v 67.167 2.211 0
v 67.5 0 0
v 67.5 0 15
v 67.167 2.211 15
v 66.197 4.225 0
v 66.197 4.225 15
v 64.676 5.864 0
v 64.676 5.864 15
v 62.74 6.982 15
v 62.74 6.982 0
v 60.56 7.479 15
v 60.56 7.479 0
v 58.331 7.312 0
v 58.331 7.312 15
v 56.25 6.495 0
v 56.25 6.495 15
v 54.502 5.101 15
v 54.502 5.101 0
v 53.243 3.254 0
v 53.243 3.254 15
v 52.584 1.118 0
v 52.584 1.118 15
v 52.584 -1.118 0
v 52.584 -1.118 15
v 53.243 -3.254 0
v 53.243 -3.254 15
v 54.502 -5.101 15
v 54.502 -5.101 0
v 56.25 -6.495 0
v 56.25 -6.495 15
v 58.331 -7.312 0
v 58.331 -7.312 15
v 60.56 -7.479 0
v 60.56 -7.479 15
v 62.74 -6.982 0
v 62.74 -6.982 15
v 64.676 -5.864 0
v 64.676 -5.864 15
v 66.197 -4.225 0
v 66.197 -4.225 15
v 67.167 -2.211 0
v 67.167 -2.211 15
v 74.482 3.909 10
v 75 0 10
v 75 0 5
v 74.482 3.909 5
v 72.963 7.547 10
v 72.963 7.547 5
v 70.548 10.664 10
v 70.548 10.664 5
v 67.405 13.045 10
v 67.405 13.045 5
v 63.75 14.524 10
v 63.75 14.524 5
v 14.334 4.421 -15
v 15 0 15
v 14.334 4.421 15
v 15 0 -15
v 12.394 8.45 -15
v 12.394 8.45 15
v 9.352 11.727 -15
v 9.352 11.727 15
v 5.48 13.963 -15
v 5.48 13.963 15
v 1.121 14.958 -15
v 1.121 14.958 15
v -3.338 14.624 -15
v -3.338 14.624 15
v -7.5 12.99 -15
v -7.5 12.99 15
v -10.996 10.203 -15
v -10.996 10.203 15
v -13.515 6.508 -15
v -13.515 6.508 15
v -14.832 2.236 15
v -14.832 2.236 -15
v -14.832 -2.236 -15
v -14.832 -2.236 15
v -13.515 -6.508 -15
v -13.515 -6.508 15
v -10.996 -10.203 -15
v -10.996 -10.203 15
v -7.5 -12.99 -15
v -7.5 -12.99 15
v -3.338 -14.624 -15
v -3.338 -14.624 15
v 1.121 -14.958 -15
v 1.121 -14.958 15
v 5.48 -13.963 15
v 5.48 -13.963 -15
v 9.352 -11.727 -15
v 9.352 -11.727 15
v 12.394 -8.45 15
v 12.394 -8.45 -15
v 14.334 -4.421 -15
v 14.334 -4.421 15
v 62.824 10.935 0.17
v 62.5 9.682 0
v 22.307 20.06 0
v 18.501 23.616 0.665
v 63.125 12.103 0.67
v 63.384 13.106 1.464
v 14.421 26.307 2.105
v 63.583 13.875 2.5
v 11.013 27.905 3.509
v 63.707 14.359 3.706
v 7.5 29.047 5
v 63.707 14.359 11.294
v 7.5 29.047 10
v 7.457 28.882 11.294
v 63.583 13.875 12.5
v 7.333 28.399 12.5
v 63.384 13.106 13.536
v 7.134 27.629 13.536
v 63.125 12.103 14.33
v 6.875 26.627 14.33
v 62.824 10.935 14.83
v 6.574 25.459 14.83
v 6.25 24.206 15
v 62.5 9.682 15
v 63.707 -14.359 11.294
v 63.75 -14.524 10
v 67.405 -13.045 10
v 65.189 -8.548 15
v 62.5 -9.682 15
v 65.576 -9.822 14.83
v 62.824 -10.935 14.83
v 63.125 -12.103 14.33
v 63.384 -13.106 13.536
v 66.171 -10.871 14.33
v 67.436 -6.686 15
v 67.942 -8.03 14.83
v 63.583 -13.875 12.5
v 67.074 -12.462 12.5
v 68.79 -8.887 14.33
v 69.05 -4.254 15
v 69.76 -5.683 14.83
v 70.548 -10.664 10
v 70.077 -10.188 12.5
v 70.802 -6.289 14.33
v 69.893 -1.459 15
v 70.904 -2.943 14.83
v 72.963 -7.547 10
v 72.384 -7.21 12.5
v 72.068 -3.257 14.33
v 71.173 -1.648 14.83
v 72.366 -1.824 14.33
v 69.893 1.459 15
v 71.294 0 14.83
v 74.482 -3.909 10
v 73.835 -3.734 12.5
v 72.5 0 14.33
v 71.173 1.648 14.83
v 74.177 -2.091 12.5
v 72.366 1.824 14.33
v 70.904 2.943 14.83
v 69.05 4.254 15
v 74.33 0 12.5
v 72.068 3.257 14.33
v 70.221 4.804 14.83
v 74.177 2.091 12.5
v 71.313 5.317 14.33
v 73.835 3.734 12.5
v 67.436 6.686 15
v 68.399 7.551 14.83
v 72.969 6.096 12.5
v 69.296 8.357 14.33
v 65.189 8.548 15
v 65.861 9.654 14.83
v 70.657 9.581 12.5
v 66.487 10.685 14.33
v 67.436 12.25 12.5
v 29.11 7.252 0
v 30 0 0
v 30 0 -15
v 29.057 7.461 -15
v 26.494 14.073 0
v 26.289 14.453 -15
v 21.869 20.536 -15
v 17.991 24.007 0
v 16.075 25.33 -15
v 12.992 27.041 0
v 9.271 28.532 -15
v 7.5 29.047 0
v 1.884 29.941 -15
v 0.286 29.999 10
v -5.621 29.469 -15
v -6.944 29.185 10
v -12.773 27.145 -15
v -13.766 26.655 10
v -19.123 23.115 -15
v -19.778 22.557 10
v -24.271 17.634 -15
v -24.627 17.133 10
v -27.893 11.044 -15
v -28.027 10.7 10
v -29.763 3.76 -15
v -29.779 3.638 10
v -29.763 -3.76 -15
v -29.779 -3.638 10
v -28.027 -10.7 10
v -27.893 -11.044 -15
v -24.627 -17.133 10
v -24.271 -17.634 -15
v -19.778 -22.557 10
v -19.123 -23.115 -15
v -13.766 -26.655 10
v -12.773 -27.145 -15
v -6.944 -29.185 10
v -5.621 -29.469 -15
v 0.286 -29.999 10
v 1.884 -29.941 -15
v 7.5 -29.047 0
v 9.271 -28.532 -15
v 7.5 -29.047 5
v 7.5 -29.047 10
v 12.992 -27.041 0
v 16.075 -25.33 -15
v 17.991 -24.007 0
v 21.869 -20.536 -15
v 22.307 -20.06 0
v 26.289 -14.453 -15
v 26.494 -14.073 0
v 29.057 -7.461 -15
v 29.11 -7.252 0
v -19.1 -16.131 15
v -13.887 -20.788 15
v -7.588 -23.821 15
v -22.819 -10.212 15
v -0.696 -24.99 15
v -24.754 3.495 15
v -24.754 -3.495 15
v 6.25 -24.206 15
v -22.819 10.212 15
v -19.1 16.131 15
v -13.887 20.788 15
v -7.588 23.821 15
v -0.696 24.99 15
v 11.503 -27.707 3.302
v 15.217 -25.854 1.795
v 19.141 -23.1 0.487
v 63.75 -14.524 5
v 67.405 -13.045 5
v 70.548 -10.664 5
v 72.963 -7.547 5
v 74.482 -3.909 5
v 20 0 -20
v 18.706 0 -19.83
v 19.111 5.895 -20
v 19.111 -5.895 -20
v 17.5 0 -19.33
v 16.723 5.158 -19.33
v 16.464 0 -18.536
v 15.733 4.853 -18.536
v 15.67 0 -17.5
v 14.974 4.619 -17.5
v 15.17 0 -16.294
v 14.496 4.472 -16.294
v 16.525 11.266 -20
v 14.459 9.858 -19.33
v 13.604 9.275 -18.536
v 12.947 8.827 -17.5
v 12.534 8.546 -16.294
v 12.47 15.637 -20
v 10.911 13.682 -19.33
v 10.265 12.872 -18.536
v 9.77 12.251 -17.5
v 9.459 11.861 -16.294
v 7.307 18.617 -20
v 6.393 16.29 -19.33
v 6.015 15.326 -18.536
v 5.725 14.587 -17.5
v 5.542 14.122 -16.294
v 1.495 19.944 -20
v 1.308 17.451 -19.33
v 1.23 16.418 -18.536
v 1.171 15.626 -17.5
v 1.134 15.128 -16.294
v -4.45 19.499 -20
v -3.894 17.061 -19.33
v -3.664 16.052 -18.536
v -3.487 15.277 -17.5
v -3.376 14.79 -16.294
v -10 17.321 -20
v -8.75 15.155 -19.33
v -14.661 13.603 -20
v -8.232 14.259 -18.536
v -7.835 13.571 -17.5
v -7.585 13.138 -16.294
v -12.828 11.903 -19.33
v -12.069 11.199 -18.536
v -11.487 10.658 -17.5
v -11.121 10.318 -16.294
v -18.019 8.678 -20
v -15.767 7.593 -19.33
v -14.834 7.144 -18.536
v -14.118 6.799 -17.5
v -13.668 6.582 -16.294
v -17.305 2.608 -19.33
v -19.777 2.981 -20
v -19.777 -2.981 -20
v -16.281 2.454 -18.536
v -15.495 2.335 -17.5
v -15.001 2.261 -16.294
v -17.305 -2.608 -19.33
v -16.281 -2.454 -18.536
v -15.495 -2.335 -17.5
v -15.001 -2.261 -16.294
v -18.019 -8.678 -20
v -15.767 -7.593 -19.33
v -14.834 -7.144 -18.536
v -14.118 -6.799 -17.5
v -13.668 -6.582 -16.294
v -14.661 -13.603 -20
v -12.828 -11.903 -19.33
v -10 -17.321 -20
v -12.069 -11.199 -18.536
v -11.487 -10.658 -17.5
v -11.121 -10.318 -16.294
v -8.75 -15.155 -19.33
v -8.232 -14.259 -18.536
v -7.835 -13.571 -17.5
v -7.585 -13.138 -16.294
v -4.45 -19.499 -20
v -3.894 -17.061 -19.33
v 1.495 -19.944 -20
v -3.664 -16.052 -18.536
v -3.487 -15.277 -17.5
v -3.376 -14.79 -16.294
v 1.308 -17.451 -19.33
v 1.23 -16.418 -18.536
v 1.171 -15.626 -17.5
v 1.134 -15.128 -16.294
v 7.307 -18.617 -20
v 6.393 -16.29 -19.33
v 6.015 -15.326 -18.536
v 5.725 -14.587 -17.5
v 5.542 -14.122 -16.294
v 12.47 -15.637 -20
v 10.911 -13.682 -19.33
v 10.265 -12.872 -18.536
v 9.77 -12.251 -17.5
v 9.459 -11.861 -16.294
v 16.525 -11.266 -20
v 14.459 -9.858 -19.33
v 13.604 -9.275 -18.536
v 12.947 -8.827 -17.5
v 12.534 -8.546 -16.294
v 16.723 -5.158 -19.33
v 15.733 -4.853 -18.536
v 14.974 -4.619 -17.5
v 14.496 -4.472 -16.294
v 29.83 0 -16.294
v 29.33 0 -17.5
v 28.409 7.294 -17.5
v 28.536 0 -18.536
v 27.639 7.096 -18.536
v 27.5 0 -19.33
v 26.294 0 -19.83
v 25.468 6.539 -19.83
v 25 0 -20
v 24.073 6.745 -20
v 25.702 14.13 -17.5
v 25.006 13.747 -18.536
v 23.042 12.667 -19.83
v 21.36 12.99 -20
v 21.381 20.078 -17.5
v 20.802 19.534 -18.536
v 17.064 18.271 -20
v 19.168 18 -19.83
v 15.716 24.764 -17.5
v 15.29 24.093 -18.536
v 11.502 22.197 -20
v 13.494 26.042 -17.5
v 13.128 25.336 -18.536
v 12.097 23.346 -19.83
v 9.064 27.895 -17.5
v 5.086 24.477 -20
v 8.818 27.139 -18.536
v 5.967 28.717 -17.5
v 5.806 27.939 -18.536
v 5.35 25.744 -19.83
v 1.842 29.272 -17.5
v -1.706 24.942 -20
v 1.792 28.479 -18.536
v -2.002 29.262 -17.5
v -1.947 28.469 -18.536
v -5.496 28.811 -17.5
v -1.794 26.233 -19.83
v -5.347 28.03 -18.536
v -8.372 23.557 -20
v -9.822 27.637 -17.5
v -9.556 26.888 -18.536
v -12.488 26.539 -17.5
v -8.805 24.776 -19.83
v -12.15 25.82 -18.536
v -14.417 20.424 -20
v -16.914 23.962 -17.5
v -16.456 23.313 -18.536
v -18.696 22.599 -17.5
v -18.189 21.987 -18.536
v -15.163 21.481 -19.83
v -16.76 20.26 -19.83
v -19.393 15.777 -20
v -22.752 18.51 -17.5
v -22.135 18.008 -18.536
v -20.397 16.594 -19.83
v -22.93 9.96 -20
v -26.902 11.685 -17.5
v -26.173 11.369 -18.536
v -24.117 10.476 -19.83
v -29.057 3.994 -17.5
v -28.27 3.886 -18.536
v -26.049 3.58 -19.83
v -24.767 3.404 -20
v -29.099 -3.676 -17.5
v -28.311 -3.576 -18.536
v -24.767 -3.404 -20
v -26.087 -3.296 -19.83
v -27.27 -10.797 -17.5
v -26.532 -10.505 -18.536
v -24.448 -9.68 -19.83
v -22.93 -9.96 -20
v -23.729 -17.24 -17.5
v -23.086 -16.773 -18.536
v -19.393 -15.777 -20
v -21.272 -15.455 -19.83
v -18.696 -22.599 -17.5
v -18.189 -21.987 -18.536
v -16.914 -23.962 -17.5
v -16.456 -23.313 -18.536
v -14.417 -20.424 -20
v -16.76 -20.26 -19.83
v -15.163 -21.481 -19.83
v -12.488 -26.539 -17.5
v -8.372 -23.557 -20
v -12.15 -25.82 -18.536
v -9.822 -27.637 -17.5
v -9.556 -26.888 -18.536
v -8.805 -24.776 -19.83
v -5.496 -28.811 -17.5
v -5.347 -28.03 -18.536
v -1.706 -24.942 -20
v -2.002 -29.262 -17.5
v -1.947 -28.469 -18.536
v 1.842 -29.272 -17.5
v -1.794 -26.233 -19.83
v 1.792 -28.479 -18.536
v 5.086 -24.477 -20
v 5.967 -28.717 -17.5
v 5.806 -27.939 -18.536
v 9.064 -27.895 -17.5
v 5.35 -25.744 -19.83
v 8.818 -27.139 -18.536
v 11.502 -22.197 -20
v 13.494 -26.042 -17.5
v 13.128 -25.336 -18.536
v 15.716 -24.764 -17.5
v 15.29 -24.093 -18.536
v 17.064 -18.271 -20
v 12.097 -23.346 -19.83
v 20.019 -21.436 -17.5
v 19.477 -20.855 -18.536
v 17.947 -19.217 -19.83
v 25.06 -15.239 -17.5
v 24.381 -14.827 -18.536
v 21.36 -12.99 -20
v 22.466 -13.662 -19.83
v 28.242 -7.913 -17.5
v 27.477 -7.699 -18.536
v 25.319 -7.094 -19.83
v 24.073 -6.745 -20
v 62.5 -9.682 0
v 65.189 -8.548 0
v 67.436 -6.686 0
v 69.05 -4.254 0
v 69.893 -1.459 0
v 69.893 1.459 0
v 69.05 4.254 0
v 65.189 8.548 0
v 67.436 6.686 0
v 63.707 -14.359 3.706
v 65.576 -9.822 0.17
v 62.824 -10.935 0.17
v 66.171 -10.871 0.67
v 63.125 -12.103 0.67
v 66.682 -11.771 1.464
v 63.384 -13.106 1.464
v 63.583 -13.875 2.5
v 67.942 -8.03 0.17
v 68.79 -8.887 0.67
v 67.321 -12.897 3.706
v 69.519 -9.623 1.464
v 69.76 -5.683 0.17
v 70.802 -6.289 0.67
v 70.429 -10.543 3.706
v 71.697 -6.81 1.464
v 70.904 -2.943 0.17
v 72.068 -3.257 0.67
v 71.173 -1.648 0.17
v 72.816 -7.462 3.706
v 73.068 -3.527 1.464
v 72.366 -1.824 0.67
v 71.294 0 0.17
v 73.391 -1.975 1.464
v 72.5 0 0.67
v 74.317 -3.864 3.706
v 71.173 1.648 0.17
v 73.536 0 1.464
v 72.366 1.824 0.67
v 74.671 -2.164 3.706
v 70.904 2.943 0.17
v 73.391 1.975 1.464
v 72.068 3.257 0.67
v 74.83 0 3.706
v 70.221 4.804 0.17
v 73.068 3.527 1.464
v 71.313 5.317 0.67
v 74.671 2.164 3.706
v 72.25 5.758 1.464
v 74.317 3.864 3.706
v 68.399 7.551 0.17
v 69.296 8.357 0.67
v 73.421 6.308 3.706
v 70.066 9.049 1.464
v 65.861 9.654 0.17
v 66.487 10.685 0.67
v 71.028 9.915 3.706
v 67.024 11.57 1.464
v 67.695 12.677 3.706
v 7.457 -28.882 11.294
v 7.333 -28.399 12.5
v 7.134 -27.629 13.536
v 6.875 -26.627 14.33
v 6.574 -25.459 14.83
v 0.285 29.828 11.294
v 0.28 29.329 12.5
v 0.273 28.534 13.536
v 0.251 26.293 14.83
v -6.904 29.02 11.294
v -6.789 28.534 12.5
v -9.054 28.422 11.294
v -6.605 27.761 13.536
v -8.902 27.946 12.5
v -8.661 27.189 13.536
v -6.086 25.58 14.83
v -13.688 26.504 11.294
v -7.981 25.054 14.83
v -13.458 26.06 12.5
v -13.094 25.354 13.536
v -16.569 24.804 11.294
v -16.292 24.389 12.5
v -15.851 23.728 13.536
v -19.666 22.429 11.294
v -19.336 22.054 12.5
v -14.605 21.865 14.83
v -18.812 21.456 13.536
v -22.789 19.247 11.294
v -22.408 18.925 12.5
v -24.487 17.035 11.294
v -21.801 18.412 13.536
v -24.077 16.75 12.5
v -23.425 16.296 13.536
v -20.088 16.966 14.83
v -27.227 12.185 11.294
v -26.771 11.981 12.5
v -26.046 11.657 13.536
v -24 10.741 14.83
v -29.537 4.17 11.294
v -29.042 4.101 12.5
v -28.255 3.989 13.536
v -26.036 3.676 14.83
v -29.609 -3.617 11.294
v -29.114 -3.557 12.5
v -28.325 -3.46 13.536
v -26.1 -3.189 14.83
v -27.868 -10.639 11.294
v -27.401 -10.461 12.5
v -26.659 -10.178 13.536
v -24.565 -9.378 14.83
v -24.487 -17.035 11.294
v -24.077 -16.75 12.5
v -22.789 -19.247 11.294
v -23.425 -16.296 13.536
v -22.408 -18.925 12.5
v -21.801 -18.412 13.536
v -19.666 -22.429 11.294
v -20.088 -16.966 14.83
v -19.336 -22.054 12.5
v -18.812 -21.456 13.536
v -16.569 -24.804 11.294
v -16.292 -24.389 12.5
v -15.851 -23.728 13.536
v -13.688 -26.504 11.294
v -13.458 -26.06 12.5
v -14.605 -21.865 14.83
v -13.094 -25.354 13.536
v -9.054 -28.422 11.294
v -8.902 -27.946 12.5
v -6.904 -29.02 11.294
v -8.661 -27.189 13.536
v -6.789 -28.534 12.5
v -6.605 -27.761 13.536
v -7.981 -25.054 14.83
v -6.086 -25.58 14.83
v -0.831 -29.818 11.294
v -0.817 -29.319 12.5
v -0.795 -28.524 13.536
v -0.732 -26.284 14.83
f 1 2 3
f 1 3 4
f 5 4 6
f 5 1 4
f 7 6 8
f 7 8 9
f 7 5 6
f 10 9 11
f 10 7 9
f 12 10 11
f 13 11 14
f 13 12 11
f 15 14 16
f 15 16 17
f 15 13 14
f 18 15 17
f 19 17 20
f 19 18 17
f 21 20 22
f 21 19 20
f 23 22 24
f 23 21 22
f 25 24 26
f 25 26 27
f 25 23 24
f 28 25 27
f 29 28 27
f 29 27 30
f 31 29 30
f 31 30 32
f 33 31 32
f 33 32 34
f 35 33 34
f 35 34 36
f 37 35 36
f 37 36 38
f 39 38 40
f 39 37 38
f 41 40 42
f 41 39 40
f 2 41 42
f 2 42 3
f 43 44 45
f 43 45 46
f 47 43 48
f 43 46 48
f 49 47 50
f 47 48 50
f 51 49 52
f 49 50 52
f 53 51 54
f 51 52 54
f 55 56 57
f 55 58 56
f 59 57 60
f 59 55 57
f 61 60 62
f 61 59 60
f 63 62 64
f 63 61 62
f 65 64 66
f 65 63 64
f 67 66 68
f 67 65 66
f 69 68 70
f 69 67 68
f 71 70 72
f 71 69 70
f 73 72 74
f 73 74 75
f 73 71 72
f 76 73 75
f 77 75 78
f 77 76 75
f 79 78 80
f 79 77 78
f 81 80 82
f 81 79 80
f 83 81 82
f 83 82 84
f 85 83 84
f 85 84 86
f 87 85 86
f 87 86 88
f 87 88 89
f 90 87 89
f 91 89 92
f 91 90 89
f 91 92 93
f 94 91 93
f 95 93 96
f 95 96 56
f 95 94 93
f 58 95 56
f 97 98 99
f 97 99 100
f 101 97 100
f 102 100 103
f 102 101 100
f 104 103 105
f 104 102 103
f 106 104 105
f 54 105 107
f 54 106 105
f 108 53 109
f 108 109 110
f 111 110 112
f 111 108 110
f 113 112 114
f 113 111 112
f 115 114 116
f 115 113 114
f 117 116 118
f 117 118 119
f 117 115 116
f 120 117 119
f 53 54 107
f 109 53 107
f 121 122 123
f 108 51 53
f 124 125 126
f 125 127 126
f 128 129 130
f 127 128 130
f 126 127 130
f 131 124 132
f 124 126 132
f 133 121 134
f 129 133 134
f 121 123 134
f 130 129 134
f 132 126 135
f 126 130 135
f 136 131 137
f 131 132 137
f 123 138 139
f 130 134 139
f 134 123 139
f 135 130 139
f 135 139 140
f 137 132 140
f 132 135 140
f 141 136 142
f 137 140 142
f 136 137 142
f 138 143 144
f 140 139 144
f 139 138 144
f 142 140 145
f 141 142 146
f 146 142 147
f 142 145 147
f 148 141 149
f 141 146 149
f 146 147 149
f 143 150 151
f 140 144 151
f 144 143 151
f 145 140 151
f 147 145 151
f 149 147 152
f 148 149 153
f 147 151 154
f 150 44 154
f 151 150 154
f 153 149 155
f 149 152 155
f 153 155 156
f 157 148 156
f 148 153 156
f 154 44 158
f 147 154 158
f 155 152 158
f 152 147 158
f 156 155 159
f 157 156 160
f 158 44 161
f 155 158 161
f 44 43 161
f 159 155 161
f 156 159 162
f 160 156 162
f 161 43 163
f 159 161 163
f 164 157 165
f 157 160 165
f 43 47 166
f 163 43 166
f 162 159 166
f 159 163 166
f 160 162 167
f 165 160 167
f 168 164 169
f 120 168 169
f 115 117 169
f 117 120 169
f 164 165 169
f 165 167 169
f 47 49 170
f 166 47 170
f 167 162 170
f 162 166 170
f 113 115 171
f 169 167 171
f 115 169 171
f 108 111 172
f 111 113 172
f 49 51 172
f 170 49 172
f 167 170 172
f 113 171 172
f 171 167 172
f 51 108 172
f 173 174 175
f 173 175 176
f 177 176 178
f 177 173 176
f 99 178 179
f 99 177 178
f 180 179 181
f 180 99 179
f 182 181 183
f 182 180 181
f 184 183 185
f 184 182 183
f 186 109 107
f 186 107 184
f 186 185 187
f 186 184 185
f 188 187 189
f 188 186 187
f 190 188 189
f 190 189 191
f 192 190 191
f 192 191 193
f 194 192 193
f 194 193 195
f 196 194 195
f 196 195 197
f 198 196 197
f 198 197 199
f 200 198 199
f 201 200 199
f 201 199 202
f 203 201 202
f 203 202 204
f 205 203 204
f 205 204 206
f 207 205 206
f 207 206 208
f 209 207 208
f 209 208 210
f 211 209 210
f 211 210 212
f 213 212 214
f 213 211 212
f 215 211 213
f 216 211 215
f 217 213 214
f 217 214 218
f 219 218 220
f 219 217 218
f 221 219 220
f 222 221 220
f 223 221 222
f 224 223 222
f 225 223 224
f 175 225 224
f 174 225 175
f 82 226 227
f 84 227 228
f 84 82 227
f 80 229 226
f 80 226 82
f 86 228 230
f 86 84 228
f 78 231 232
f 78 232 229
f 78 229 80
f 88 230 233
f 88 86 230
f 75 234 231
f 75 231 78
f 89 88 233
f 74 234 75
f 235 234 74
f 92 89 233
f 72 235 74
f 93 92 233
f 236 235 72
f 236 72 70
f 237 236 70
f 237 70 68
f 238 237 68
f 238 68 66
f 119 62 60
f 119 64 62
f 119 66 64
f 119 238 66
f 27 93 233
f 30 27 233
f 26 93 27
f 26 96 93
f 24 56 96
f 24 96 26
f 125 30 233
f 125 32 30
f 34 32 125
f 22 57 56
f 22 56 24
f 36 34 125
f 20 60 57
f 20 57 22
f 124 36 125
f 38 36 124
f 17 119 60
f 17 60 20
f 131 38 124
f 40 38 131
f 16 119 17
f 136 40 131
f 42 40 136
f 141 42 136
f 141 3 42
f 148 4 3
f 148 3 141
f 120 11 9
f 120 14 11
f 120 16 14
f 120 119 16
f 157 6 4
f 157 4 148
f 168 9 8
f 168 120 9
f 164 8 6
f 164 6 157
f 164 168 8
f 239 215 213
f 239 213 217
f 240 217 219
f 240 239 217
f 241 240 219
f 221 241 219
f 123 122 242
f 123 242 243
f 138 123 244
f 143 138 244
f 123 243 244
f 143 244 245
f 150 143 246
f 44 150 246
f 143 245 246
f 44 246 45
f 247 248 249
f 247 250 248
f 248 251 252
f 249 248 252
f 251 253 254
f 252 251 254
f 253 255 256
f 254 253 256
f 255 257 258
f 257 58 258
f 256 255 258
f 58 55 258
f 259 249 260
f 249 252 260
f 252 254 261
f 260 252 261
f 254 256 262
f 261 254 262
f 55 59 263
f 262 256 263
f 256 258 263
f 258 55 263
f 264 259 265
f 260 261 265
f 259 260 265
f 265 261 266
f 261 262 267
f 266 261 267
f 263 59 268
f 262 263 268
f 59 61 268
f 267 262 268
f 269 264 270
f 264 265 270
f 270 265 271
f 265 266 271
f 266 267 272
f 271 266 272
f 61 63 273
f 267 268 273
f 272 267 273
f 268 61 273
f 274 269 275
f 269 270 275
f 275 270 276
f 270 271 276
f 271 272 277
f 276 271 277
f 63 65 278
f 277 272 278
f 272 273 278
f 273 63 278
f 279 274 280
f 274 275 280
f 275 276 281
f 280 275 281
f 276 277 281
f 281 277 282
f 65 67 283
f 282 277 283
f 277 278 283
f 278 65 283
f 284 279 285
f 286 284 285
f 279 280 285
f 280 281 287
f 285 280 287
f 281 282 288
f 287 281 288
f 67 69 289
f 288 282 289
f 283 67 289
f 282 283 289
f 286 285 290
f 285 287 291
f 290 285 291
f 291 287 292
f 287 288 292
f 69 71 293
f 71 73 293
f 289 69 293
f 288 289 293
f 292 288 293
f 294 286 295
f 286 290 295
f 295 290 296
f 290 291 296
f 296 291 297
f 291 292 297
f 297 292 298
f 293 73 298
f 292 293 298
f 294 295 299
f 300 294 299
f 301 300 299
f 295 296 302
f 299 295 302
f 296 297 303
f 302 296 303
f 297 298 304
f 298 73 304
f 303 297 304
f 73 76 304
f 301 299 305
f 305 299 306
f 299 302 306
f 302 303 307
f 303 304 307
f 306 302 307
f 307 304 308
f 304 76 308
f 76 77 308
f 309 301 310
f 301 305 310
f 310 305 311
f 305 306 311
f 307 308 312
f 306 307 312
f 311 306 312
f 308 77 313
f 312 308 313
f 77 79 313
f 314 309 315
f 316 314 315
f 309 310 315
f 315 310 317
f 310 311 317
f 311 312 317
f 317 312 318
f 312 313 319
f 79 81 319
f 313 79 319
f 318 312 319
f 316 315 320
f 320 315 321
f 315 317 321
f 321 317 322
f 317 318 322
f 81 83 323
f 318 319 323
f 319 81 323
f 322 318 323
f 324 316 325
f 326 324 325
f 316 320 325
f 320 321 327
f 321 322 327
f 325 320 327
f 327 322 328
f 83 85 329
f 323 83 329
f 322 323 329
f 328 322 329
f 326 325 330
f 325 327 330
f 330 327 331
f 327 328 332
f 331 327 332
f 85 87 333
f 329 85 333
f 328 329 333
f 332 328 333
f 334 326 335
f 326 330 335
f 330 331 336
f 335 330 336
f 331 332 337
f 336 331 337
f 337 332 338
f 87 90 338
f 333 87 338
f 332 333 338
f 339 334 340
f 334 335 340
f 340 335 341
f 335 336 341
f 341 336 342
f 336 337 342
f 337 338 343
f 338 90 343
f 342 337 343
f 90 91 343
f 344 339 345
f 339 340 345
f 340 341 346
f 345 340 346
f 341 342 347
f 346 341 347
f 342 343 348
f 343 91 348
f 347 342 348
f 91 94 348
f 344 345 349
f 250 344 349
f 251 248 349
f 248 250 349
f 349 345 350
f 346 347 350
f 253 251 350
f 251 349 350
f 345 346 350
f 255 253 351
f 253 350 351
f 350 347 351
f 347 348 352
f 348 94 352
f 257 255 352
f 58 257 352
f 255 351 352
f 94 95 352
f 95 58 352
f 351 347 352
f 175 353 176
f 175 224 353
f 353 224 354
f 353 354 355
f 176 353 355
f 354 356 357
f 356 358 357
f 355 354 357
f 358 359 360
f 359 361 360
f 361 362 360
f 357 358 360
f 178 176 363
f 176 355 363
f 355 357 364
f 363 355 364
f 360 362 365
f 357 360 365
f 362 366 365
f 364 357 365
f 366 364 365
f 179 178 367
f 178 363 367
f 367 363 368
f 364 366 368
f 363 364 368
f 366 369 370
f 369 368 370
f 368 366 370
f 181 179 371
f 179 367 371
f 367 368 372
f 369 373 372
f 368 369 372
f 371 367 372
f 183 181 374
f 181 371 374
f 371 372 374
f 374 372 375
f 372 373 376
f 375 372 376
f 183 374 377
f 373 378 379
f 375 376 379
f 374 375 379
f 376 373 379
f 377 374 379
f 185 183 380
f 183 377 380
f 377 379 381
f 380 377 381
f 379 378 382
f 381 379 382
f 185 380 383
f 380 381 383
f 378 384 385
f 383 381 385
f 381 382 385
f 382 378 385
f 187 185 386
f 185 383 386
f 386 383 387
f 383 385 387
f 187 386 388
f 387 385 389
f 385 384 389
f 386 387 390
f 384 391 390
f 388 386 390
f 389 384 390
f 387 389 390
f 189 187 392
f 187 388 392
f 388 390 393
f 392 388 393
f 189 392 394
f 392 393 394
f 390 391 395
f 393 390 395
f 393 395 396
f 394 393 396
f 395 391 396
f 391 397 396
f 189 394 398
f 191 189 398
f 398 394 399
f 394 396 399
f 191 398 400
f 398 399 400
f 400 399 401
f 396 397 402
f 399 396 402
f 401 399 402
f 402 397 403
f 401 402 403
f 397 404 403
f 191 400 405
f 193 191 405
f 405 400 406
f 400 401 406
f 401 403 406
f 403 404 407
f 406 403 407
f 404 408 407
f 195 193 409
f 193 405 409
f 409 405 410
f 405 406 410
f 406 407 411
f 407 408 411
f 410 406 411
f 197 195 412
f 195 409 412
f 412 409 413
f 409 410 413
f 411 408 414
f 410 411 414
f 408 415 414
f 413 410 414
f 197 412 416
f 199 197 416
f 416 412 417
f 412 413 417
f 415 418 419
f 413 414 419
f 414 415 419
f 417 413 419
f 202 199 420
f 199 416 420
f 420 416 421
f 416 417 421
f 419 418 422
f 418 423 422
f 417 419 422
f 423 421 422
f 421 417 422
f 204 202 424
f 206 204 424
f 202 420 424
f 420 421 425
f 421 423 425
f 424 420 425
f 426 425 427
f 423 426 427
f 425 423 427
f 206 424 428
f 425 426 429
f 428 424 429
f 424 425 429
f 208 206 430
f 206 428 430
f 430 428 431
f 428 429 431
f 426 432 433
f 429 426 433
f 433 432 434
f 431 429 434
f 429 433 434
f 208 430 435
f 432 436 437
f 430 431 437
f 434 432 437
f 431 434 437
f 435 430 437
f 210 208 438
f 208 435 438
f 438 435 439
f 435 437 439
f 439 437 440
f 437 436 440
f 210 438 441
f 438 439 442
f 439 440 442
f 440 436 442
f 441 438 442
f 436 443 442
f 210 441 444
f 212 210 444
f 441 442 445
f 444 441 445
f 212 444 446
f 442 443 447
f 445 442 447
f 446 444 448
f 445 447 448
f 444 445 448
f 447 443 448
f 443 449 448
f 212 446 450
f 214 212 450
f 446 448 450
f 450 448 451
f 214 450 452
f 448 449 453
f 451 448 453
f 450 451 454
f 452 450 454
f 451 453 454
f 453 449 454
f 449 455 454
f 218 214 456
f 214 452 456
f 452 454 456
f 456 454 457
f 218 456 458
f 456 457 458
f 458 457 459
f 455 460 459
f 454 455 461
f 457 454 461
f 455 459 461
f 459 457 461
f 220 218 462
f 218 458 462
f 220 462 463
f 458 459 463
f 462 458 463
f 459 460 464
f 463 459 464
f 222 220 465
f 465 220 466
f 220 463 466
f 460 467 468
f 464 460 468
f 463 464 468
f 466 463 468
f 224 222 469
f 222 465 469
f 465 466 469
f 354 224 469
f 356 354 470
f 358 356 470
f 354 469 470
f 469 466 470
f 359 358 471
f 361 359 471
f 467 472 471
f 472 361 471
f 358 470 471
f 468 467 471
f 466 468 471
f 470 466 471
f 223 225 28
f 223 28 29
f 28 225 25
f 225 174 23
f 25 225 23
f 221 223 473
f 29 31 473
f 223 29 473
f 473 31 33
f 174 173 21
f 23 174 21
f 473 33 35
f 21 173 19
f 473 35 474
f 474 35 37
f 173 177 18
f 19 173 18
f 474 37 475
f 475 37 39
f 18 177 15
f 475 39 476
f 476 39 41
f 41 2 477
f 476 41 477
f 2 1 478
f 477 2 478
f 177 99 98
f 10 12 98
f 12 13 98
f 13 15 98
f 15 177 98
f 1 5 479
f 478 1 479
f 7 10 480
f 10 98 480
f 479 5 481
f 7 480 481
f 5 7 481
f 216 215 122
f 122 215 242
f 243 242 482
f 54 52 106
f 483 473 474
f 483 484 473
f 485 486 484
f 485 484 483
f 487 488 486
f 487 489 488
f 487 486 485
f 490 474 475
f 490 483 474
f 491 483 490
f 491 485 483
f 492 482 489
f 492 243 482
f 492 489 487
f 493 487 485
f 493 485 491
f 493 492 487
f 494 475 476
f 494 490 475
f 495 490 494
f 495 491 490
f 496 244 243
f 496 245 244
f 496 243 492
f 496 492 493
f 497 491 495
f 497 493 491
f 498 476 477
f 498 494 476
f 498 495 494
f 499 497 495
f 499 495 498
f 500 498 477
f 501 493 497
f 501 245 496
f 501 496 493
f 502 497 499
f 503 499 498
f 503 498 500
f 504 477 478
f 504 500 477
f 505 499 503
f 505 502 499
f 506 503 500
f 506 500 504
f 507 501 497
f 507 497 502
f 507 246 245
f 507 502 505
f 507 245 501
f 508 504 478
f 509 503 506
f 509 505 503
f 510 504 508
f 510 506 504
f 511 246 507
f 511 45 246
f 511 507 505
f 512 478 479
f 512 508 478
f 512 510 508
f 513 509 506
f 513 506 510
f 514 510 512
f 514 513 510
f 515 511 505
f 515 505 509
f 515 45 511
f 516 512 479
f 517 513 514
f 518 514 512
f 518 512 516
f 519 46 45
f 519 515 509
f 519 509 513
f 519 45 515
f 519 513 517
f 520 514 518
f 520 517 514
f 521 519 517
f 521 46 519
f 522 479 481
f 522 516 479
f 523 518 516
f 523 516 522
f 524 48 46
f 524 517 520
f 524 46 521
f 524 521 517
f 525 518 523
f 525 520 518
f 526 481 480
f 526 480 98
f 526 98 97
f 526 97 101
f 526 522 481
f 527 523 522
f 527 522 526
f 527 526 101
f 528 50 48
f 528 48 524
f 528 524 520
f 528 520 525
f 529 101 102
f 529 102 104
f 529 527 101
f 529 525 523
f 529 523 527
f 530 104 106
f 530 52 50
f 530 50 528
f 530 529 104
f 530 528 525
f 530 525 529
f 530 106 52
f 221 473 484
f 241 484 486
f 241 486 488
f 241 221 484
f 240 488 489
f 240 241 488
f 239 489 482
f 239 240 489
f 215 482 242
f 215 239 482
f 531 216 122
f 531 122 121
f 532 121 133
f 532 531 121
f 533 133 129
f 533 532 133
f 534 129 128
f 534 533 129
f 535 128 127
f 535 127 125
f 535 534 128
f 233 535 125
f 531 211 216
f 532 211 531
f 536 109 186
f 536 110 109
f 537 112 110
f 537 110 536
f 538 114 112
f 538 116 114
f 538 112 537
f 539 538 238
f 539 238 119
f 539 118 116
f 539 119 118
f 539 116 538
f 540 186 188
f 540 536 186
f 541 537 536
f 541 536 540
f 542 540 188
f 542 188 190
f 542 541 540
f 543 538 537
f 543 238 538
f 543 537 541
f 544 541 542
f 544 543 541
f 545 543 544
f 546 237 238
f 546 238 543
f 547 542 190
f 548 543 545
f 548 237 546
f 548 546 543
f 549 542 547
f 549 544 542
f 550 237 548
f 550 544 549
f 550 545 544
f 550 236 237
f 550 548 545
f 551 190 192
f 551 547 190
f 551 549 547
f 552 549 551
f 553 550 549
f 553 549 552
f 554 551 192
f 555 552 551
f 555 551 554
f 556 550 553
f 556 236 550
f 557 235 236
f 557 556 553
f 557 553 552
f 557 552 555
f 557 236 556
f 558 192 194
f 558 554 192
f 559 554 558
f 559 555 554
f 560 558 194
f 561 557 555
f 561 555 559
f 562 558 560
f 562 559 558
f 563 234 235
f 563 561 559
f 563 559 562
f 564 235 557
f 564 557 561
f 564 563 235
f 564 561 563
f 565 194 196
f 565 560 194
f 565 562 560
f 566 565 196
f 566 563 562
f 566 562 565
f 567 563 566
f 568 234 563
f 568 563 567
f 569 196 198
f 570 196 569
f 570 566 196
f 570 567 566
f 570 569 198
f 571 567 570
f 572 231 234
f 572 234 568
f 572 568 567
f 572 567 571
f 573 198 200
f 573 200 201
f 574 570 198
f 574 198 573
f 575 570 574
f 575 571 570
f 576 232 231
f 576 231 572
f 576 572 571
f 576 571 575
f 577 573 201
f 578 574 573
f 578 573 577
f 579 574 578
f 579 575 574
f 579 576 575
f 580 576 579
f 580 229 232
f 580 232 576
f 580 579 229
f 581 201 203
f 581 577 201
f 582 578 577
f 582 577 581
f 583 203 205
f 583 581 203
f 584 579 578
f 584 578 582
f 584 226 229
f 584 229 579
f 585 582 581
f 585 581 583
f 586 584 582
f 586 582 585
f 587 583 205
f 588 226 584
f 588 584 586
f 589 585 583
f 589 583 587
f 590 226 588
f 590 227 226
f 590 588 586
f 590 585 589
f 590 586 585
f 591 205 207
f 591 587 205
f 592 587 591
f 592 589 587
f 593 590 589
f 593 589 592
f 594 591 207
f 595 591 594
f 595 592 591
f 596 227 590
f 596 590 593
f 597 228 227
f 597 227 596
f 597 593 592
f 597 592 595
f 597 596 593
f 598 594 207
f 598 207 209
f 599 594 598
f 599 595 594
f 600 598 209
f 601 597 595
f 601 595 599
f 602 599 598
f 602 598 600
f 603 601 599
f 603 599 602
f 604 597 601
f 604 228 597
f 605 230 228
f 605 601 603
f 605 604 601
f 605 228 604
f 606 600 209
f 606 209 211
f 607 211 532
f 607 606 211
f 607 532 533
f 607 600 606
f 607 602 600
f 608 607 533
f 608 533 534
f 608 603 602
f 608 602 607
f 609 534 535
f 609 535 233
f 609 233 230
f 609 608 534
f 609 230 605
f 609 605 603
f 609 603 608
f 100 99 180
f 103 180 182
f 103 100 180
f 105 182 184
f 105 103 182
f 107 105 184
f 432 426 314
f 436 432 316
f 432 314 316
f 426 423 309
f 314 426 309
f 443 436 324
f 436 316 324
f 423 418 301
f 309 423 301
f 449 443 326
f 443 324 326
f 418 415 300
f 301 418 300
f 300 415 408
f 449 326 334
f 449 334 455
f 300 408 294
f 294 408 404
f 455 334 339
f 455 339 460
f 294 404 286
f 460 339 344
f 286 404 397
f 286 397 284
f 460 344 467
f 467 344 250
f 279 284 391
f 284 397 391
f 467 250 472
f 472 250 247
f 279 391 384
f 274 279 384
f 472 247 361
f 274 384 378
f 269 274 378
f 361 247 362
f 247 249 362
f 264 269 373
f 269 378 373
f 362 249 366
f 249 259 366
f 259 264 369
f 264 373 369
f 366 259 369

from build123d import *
from build123d import SkipClean  # not in build123d's __all__

# Parameters (mm, degrees)
F0_R         = 15
F0_R_2       = 7.5
F1_DEPTH     = 15
F2_DEPTH     = 20
F3_R         = 5
F4_T1_DEPTH  = 58.0947501931
F4_T3_DEPTH  = 58.0947501931
F4_T8_DEPTH  = 79.3447501931
F4_S9_R      = 30
F4_T10_DEPTH = 43
F4_T12_ANGLE = 151.0449756281
F4_T14_ANGLE = 151.0449756281
F4_T18_DEPTH = 79.3447501931
F4_S19_R     = 30
F4_T20_DEPTH = 43
F4_T22_ANGLE = 208.9550243719


# Not quite as in the source:
# - a fillet or chamfer that OpenCascade refuses, or shapes differently, is made with other operations: its cross-section is extruded or revolved along the edge and cut away or added


with BuildPart() as f1:
    # F0 (on Top) → F1 (new body)
    with BuildSketch(Plane.XY):
        with BuildLine():
            ThreePointArc((7.5, -29.0473750966), (23.7170824513, -18.3711730709), (30, 0))
            ThreePointArc((30, 0), (23.7170824513, 18.3711730709), (7.5, 29.0473750966))
            ThreePointArc((7.5, 29.0473750966), (-30, 0), (7.5, -29.0473750966))
        make_face()
        Circle(F0_R, mode=Mode.SUBTRACT)
        with BuildLine():
            ThreePointArc((7.5, 29.0473750966), (23.7170824513, 18.3711730709), (30, 0))
            ThreePointArc((30, 0), (23.7170824513, -18.3711730709), (7.5, -29.0473750966))
            Line((7.5, -29.0473750966), (63.75, -14.5236875483))
            ThreePointArc((63.75, -14.5236875483), (45, 0), (63.75, 14.5236875483))
            Line((63.75, 14.5236875483), (7.5, 29.0473750966))
        make_face()
        with BuildLine():
            ThreePointArc((75, 0), (71.8585412256, 9.1855865354), (63.75, 14.5236875483))
            ThreePointArc((63.75, 14.5236875483), (45, 0), (63.75, -14.5236875483))
            ThreePointArc((63.75, -14.5236875483), (71.8585412256, -9.1855865354), (75, 0))
        make_face()
        with Locations((60, 0)):
            Circle(F0_R_2, mode=Mode.SUBTRACT)
    extrude(amount=F1_DEPTH)

    # F0 (on Top) → F2 (join)
    with BuildSketch(Plane.XY):
        with BuildLine():
            ThreePointArc((7.5, -29.0473750966), (23.7170824513, -18.3711730709), (30, 0))
            ThreePointArc((30, 0), (23.7170824513, 18.3711730709), (7.5, 29.0473750966))
            ThreePointArc((7.5, 29.0473750966), (-30, 0), (7.5, -29.0473750966))
        make_face()
        Circle(F0_R, mode=Mode.SUBTRACT)
    with SkipClean():  # cleaning this boolean's faces spoils the solid; the shape is the same uncleaned
        extrude(amount=-F2_DEPTH)

    # F3
    f3_edges = [f1.edges().sort_by_distance(p)[0] for p in [
        (-7.5, 29.047375, -20),
        (-15, 0, -20),
    ]]
    fillet(f3_edges, radius=F3_R)

    # F4: fillet of radius 5 on 11 edges, made by hand

    # F4_s2 → F4_t1 (cut)
    with BuildSketch(Plane(origin=(0, 0, 0), x_dir=(0, 0, 1), z_dir=(0.9682458366, 0.25, 0))):
        with BuildLine():
            ThreePointArc((10, 30), (13.5355339059, 28.5355339059), (15, 25))
            Line((15, 25), (15, 30))
            Line((15, 30), (10, 30))
        make_face()
    extrude(amount=F4_T1_DEPTH, mode=Mode.SUBTRACT)

    # F4_s4 → F4_t3 (cut)
    with BuildSketch(Plane(origin=(56.25, -14.5236875483, 0), x_dir=(0, 0, 1), z_dir=(-0.9682458366, 0.25, 0))):
        with BuildLine():
            ThreePointArc((10, 30), (13.5355339059, 28.5355339059), (15, 25))
            Line((15, 25), (15, 30))
            Line((15, 30), (10, 30))
        make_face()
    extrude(amount=F4_T3_DEPTH, mode=Mode.SUBTRACT)


with BuildPart() as f4_tool6:
    # F4_s7 → F4_t8 (new body)
    with BuildSketch(Plane(origin=(-20.5752240267, -5.3125, 0), x_dir=(0, 0, 1), z_dir=(0.9682458366, 0.25, 0))):
        with BuildLine():
            ThreePointArc((0, 25), (1.4644660941, 28.5355339059), (5, 30))
            Line((5, 30), (0, 30))
            Line((0, 30), (0, 25))
        make_face()
    extrude(amount=F4_T8_DEPTH)

    # F4_s9 → F4_t10 (cut, symmetric)
    with BuildSketch(Plane.XY.offset(2.5)):
        Circle(F4_S9_R)
    extrude(amount=F4_T10_DEPTH, both=True, mode=Mode.SUBTRACT)


with BuildPart() as f1_1:
    add(f1.part, clean=False)

    # F4_t5: cut F4_tool6
    add(f4_tool6.part, mode=Mode.SUBTRACT)

    # F4_s11 → F4_t12 (revolve, cut)
    with BuildSketch(Plane(origin=(56.25, 14.5236875483, 0), x_dir=(0, 0, 1), z_dir=(-0.9682458366, -0.25, 0))):
        with BuildLine():
            ThreePointArc((0, -25), (1.4644660941, -28.5355339059), (5, -30))
            Line((5, -30), (0, -30))
            Line((0, -30), (0, -25))
        make_face()
    revolve(axis=Axis((60, 0, 0), (0, 0, 1)), revolution_arc=F4_T12_ANGLE, mode=Mode.SUBTRACT)

    # F4_s13 → F4_t14 (revolve, cut)
    with BuildSketch(Plane(origin=(56.25, 14.5236875483, 0), x_dir=(0, 0, 1), z_dir=(-0.9682458366, -0.25, 0))):
        with BuildLine():
            ThreePointArc((15, -25), (13.5355339059, -28.5355339059), (10, -30))
            Line((10, -30), (15, -30))
            Line((15, -30), (15, -25))
        make_face()
    revolve(axis=Axis((60, 0, 15), (0, 0, 1)), revolution_arc=F4_T14_ANGLE, mode=Mode.SUBTRACT)


with BuildPart() as f4_tool16:
    # F4_s17 → F4_t18 (new body)
    with BuildSketch(Plane(origin=(56.25, -14.5236875483, 0), x_dir=(0, 0, 1), z_dir=(-0.9682458366, 0.25, 0))):
        with BuildLine():
            ThreePointArc((0, 25), (1.4644660941, 28.5355339059), (5, 30))
            Line((5, 30), (0, 30))
            Line((0, 30), (0, 25))
        make_face()
    extrude(amount=F4_T18_DEPTH)

    # F4_s19 → F4_t20 (cut, symmetric)
    with BuildSketch(Plane.XY.offset(2.5)):
        Circle(F4_S19_R)
    extrude(amount=F4_T20_DEPTH, both=True, mode=Mode.SUBTRACT)


with BuildPart() as f1_2:
    add(f1_1.part, clean=False)

    # F4_t15: cut F4_tool16
    add(f4_tool16.part, mode=Mode.SUBTRACT)

    # F4_s21 → F4_t22 (revolve, cut)
    with BuildSketch(Plane(origin=(0, 0, 0), x_dir=(0, 0, 1), z_dir=(0.9682458366, -0.25, 0))):
        with BuildLine():
            ThreePointArc((10, -30), (13.5355339059, -28.5355339059), (15, -25))
            Line((15, -25), (15, -30))
            Line((15, -30), (10, -30))
        make_face()
    revolve(axis=Axis((0, 0, 15), (0, 0, 1)), revolution_arc=F4_T22_ANGLE, mode=Mode.SUBTRACT)


solid = f1_2.part
